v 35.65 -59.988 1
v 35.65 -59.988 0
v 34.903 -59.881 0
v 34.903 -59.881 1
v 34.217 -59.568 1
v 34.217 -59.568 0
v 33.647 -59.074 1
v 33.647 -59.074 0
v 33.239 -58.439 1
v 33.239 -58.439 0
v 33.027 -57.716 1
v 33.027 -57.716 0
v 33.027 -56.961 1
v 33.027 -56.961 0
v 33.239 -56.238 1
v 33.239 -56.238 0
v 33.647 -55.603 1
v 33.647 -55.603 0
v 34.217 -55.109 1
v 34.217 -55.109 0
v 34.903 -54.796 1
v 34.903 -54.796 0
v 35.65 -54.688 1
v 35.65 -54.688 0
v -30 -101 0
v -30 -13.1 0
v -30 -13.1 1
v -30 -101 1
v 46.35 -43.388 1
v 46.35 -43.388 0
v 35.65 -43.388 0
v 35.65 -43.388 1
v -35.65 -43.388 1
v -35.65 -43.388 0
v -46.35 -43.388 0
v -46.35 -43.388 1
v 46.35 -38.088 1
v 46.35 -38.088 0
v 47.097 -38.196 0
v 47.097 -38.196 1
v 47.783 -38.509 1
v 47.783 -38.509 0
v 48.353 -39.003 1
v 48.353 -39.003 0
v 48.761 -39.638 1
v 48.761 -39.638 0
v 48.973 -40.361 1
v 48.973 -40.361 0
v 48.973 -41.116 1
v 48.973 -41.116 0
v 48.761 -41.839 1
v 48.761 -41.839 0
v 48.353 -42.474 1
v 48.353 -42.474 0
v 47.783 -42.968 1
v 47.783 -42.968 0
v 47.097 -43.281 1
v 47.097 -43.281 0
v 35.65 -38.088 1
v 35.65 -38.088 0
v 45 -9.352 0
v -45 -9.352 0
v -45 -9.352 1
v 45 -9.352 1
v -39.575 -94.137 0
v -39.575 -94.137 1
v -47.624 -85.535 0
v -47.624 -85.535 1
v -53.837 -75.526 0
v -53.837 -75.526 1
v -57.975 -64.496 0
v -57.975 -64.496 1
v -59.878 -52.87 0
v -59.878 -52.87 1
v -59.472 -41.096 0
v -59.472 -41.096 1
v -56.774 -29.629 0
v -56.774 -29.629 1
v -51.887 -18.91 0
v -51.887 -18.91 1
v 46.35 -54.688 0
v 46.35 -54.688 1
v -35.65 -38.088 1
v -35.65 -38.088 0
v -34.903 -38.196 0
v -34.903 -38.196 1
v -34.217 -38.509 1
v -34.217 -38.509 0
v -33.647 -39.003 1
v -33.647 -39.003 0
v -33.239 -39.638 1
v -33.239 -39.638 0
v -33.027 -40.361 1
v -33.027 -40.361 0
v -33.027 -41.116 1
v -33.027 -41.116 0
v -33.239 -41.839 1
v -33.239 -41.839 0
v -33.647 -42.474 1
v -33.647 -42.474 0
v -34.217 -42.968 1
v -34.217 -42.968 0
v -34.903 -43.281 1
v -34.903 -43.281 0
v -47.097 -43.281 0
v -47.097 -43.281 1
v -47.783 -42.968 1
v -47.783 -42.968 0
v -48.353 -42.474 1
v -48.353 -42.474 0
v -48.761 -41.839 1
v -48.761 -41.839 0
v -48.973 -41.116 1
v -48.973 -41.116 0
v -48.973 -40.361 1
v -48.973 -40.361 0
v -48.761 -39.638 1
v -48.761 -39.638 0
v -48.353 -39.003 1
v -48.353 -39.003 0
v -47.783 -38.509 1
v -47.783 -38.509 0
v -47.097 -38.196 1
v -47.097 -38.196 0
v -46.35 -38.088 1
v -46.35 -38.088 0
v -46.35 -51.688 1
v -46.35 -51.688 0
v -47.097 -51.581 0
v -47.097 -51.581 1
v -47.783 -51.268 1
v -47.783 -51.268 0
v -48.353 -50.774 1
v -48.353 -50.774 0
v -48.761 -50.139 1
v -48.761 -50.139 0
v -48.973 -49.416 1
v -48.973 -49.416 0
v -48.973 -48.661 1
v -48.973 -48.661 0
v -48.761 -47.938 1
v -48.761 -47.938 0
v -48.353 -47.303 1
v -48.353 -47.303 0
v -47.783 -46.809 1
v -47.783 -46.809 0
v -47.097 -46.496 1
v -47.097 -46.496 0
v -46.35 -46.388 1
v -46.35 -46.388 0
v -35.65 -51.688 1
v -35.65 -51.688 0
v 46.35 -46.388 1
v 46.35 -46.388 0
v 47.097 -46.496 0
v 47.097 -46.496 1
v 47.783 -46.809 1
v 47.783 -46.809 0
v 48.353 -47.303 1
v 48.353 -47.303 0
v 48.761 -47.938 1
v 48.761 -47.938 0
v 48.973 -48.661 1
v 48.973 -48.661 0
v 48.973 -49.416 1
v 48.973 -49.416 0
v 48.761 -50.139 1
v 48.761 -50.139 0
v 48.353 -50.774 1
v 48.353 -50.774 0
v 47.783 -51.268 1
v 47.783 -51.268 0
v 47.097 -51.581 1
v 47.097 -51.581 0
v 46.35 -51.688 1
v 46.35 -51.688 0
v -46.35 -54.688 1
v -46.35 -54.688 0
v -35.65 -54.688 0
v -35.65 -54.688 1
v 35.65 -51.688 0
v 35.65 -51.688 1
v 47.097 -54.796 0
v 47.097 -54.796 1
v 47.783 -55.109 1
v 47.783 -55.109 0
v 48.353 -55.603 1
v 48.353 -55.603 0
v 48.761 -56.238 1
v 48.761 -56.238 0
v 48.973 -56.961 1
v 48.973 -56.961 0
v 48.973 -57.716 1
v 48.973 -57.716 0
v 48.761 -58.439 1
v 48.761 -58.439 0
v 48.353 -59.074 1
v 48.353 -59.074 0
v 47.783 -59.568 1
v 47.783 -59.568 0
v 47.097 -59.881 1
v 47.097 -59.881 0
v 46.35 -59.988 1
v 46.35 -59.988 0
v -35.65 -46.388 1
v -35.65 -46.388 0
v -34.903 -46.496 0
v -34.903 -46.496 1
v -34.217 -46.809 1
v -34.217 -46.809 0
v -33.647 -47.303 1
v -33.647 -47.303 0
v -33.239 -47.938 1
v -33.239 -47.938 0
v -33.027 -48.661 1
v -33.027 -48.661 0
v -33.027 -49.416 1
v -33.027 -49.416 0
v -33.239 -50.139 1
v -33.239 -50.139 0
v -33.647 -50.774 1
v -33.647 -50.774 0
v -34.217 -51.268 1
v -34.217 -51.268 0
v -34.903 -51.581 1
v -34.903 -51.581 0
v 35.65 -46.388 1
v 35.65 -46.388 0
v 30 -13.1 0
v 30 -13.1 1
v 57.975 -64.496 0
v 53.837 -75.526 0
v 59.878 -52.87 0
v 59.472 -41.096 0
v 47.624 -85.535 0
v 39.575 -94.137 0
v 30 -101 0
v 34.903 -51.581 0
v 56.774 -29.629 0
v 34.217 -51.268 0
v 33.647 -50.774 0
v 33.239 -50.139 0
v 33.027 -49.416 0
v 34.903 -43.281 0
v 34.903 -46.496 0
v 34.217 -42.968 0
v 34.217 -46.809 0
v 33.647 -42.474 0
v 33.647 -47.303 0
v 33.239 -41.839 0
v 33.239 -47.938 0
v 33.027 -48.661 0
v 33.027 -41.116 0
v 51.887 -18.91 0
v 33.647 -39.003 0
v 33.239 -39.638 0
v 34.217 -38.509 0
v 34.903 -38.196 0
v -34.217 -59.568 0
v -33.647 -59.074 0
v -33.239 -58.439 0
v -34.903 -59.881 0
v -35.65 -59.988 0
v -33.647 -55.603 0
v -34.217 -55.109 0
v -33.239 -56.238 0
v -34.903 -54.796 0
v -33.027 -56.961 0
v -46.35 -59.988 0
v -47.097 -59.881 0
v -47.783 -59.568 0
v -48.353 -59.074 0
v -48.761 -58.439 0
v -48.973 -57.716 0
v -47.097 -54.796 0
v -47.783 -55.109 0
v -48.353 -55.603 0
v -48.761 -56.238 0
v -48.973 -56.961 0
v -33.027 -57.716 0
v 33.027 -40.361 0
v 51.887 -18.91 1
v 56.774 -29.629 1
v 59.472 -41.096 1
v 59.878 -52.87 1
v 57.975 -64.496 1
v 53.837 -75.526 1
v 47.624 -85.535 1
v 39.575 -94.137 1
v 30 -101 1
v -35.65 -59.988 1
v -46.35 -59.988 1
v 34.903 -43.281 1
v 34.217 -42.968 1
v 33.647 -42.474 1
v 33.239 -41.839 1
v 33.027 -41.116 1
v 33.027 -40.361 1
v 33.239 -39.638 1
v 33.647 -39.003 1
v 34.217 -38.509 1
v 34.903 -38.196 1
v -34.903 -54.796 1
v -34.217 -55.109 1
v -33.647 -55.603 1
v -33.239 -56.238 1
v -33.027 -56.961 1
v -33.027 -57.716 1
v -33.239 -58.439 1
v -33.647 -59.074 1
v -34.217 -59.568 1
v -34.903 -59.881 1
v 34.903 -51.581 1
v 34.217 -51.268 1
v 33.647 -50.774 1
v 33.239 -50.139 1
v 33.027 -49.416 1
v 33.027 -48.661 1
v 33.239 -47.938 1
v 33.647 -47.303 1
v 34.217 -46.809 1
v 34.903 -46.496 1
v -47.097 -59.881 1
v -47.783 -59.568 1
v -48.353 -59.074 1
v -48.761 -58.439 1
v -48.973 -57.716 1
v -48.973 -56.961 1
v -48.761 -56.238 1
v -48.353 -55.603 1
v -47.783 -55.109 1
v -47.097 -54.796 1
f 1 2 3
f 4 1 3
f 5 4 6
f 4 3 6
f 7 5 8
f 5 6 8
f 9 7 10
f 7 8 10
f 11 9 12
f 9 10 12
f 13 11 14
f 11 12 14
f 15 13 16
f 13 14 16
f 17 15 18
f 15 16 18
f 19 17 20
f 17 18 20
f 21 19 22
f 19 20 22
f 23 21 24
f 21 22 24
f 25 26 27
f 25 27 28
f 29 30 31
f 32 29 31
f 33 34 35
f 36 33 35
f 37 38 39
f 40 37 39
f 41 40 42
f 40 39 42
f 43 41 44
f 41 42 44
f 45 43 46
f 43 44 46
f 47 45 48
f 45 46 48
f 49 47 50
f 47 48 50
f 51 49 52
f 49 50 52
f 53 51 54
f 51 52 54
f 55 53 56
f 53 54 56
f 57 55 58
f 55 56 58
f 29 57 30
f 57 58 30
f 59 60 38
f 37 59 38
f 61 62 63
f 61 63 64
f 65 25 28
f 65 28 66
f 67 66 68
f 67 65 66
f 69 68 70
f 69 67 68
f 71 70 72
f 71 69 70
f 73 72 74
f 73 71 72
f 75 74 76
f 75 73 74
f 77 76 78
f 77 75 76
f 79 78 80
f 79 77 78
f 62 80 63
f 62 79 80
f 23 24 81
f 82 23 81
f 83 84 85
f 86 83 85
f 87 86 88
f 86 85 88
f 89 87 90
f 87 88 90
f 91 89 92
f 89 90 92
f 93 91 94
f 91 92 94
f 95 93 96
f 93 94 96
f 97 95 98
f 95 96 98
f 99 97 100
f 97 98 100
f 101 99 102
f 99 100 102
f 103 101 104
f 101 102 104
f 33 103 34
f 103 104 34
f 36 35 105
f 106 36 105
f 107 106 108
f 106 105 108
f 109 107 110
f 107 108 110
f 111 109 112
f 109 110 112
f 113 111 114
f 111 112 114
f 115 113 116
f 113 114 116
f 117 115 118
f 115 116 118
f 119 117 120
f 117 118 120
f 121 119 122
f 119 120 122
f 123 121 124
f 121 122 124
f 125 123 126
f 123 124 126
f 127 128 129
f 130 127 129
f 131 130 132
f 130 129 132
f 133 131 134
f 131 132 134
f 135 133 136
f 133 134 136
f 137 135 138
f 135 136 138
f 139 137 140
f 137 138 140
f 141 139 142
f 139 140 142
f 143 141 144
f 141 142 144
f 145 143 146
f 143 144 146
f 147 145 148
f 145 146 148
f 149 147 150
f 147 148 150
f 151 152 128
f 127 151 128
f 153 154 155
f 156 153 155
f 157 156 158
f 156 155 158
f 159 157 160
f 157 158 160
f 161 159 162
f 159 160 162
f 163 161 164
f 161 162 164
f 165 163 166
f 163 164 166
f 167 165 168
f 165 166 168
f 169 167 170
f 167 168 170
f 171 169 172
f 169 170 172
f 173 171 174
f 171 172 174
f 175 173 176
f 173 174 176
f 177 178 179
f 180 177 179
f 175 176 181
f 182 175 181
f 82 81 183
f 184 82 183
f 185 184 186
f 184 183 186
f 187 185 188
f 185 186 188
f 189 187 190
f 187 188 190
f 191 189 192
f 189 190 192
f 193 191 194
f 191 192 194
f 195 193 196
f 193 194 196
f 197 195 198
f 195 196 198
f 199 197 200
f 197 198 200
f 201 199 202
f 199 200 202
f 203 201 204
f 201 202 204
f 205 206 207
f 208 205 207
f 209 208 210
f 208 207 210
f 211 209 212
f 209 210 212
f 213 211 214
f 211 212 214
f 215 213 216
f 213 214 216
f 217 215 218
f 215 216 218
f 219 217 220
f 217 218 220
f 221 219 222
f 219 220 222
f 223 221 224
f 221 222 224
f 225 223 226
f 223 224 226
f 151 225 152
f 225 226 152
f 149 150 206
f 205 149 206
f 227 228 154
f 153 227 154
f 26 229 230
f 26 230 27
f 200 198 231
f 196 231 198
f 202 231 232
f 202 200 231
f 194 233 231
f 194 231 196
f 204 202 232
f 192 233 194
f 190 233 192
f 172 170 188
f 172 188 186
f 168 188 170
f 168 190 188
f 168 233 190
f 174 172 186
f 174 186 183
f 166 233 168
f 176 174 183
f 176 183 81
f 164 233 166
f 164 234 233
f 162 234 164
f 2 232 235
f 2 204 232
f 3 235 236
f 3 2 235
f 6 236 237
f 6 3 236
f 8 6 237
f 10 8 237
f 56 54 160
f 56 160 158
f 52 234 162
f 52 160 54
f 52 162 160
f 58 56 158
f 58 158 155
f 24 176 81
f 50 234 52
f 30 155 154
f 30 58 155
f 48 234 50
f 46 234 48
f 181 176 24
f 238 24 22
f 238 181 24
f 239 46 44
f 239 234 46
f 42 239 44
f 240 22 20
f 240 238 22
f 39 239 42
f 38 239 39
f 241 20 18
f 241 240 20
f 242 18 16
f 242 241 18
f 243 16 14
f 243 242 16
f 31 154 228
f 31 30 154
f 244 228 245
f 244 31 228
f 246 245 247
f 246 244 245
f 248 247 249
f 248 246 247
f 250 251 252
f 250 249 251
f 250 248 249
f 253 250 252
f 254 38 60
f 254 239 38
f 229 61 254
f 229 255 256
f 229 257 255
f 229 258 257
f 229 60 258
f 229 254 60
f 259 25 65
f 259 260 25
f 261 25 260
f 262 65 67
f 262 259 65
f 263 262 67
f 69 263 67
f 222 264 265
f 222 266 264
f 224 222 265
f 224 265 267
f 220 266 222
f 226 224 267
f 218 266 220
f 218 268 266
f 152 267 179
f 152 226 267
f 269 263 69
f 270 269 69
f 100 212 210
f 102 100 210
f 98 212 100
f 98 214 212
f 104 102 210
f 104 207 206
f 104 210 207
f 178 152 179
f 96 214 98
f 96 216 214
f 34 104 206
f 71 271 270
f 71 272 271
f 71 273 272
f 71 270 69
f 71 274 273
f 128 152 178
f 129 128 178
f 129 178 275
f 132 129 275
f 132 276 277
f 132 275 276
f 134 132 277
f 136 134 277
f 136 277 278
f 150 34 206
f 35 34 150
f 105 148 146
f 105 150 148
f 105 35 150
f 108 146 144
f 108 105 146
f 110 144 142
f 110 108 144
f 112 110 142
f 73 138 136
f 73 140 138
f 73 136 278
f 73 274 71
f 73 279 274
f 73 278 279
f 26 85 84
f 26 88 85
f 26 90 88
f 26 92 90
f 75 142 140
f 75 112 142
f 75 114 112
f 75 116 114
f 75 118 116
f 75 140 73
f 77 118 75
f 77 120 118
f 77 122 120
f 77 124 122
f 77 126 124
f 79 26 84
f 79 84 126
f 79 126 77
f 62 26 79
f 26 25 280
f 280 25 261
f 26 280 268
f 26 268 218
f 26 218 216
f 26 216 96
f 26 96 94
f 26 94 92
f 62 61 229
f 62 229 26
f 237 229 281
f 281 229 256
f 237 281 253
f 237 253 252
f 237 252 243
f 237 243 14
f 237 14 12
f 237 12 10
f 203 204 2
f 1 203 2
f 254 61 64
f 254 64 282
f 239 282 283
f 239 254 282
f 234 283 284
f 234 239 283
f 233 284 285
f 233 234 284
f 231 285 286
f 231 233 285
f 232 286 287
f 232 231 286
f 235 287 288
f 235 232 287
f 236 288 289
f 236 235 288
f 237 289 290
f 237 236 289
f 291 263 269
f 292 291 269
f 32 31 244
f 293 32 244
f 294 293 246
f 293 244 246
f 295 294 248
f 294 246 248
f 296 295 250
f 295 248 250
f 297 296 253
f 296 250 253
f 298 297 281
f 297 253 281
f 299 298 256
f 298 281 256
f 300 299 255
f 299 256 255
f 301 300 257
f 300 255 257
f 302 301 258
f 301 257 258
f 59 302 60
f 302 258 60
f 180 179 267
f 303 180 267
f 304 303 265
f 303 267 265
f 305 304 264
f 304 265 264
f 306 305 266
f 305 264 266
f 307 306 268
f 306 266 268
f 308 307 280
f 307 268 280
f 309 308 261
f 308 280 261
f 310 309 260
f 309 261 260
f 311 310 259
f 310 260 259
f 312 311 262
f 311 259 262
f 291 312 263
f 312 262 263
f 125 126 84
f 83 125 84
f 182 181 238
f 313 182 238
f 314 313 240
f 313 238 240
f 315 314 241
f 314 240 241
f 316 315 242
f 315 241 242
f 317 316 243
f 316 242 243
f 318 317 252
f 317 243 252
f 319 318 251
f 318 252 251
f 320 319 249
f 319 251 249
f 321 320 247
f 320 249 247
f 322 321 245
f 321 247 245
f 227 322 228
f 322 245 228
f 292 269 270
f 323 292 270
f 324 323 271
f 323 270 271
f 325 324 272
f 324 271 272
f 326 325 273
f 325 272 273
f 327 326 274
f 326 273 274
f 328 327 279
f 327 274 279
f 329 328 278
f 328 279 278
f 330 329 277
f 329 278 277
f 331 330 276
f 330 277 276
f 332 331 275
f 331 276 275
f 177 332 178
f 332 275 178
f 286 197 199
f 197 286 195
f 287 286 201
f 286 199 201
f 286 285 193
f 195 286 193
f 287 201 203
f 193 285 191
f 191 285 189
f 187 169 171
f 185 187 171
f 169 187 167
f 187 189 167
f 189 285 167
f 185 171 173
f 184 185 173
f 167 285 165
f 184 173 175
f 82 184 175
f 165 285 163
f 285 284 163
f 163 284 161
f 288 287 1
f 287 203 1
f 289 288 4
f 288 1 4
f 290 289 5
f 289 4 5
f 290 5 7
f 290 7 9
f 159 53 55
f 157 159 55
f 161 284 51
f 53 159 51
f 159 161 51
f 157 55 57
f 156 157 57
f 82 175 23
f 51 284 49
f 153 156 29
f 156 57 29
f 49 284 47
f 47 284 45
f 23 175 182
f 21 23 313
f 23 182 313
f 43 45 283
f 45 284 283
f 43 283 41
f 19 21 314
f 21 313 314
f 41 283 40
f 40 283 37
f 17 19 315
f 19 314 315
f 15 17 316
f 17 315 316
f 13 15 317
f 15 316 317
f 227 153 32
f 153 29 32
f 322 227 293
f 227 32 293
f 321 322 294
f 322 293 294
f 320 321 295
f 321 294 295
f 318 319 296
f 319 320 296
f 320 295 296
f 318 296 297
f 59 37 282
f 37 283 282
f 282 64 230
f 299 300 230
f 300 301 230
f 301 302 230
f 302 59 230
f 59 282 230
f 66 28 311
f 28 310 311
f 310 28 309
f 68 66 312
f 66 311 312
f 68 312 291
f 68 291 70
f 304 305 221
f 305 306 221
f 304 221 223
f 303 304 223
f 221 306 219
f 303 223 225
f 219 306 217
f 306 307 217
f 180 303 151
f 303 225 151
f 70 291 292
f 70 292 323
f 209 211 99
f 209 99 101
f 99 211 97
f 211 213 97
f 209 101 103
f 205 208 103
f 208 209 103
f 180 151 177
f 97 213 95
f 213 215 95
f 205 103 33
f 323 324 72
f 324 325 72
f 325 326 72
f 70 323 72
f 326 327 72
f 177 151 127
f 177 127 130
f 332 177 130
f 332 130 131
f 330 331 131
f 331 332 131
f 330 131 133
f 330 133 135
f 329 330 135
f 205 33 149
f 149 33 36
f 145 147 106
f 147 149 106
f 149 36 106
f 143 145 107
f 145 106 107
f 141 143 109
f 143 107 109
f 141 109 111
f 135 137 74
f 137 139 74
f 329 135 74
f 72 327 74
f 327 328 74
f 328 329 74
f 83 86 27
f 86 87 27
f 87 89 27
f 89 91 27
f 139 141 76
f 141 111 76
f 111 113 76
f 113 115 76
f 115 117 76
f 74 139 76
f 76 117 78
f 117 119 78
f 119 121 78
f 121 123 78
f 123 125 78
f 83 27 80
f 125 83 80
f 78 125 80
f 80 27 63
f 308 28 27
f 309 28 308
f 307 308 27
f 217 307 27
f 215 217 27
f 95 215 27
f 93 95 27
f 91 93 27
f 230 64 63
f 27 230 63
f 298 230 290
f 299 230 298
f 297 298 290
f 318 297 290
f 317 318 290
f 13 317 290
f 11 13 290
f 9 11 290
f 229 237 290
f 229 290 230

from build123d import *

# Parameters (mm, degrees)
BOSS_EXTRUDE2_DEPTH = 1


with BuildPart() as part:
    # Sketch1 → Boss-Extrude2 (new body)
    with BuildSketch(Plane.XY):
        with BuildLine():
            Line((-30, -13.100406207), (-30, -101))
            ThreePointArc((-30, -101), (-59.212156956, -58.729733103), (-45, -9.352206107))
            Line((-45, -9.352206107), (45, -9.352206107))
            ThreePointArc((45, -9.352206107), (59.212156956, -58.729733103), (30, -101))
            Line((30, -101), (30, -13.100406207))
            Line((30, -13.100406207), (-30, -13.100406207))
        make_face()
        with BuildLine():
            Line((-35.65, -43.388475773), (-46.35, -43.388475773))
            ThreePointArc((-46.35, -43.388475773), (-49, -40.738475773), (-46.35, -38.088475773))
            Line((-46.35, -38.088475773), (-35.65, -38.088475773))
            ThreePointArc((-35.65, -38.088475773), (-33, -40.738475773), (-35.65, -43.388475773))
        make_face(mode=Mode.SUBTRACT)
        with BuildLine():
            Line((-35.65, -51.688475773), (-46.35, -51.688475773))
            ThreePointArc((-46.35, -51.688475773), (-49, -49.038475773), (-46.35, -46.388475773))
            Line((-46.35, -46.388475773), (-35.65, -46.388475773))
            ThreePointArc((-35.65, -46.388475773), (-33, -49.038475773), (-35.65, -51.688475773))
        make_face(mode=Mode.SUBTRACT)
        with BuildLine():
            Line((-35.65, -59.988475773), (-46.35, -59.988475773))
            ThreePointArc((-46.35, -59.988475773), (-49, -57.338475773), (-46.35, -54.688475773))
            Line((-46.35, -54.688475773), (-35.65, -54.688475773))
            ThreePointArc((-35.65, -54.688475773), (-33, -57.338475773), (-35.65, -59.988475773))
        make_face(mode=Mode.SUBTRACT)
        with BuildLine():
            Line((46.35, -43.388475773), (35.65, -43.388475773))
            ThreePointArc((35.65, -43.388475773), (33, -40.738475773), (35.65, -38.088475773))
            Line((35.65, -38.088475773), (46.35, -38.088475773))
            ThreePointArc((46.35, -38.088475773), (49, -40.738475773), (46.35, -43.388475773))
        make_face(mode=Mode.SUBTRACT)
        with BuildLine():
            Line((46.35, -51.688475773), (35.65, -51.688475773))
            ThreePointArc((35.65, -51.688475773), (33, -49.038475773), (35.65, -46.388475773))
            Line((35.65, -46.388475773), (46.35, -46.388475773))
            ThreePointArc((46.35, -46.388475773), (49, -49.038475773), (46.35, -51.688475773))
        make_face(mode=Mode.SUBTRACT)
        with BuildLine():
            Line((46.35, -59.988475773), (35.65, -59.988475773))
            ThreePointArc((35.65, -59.988475773), (33, -57.338475773), (35.65, -54.688475773))
            Line((35.65, -54.688475773), (46.35, -54.688475773))
            ThreePointArc((46.35, -54.688475773), (49, -57.338475773), (46.35, -59.988475773))
        make_face(mode=Mode.SUBTRACT)
    extrude(amount=BOSS_EXTRUDE2_DEPTH)


solid = part.part
